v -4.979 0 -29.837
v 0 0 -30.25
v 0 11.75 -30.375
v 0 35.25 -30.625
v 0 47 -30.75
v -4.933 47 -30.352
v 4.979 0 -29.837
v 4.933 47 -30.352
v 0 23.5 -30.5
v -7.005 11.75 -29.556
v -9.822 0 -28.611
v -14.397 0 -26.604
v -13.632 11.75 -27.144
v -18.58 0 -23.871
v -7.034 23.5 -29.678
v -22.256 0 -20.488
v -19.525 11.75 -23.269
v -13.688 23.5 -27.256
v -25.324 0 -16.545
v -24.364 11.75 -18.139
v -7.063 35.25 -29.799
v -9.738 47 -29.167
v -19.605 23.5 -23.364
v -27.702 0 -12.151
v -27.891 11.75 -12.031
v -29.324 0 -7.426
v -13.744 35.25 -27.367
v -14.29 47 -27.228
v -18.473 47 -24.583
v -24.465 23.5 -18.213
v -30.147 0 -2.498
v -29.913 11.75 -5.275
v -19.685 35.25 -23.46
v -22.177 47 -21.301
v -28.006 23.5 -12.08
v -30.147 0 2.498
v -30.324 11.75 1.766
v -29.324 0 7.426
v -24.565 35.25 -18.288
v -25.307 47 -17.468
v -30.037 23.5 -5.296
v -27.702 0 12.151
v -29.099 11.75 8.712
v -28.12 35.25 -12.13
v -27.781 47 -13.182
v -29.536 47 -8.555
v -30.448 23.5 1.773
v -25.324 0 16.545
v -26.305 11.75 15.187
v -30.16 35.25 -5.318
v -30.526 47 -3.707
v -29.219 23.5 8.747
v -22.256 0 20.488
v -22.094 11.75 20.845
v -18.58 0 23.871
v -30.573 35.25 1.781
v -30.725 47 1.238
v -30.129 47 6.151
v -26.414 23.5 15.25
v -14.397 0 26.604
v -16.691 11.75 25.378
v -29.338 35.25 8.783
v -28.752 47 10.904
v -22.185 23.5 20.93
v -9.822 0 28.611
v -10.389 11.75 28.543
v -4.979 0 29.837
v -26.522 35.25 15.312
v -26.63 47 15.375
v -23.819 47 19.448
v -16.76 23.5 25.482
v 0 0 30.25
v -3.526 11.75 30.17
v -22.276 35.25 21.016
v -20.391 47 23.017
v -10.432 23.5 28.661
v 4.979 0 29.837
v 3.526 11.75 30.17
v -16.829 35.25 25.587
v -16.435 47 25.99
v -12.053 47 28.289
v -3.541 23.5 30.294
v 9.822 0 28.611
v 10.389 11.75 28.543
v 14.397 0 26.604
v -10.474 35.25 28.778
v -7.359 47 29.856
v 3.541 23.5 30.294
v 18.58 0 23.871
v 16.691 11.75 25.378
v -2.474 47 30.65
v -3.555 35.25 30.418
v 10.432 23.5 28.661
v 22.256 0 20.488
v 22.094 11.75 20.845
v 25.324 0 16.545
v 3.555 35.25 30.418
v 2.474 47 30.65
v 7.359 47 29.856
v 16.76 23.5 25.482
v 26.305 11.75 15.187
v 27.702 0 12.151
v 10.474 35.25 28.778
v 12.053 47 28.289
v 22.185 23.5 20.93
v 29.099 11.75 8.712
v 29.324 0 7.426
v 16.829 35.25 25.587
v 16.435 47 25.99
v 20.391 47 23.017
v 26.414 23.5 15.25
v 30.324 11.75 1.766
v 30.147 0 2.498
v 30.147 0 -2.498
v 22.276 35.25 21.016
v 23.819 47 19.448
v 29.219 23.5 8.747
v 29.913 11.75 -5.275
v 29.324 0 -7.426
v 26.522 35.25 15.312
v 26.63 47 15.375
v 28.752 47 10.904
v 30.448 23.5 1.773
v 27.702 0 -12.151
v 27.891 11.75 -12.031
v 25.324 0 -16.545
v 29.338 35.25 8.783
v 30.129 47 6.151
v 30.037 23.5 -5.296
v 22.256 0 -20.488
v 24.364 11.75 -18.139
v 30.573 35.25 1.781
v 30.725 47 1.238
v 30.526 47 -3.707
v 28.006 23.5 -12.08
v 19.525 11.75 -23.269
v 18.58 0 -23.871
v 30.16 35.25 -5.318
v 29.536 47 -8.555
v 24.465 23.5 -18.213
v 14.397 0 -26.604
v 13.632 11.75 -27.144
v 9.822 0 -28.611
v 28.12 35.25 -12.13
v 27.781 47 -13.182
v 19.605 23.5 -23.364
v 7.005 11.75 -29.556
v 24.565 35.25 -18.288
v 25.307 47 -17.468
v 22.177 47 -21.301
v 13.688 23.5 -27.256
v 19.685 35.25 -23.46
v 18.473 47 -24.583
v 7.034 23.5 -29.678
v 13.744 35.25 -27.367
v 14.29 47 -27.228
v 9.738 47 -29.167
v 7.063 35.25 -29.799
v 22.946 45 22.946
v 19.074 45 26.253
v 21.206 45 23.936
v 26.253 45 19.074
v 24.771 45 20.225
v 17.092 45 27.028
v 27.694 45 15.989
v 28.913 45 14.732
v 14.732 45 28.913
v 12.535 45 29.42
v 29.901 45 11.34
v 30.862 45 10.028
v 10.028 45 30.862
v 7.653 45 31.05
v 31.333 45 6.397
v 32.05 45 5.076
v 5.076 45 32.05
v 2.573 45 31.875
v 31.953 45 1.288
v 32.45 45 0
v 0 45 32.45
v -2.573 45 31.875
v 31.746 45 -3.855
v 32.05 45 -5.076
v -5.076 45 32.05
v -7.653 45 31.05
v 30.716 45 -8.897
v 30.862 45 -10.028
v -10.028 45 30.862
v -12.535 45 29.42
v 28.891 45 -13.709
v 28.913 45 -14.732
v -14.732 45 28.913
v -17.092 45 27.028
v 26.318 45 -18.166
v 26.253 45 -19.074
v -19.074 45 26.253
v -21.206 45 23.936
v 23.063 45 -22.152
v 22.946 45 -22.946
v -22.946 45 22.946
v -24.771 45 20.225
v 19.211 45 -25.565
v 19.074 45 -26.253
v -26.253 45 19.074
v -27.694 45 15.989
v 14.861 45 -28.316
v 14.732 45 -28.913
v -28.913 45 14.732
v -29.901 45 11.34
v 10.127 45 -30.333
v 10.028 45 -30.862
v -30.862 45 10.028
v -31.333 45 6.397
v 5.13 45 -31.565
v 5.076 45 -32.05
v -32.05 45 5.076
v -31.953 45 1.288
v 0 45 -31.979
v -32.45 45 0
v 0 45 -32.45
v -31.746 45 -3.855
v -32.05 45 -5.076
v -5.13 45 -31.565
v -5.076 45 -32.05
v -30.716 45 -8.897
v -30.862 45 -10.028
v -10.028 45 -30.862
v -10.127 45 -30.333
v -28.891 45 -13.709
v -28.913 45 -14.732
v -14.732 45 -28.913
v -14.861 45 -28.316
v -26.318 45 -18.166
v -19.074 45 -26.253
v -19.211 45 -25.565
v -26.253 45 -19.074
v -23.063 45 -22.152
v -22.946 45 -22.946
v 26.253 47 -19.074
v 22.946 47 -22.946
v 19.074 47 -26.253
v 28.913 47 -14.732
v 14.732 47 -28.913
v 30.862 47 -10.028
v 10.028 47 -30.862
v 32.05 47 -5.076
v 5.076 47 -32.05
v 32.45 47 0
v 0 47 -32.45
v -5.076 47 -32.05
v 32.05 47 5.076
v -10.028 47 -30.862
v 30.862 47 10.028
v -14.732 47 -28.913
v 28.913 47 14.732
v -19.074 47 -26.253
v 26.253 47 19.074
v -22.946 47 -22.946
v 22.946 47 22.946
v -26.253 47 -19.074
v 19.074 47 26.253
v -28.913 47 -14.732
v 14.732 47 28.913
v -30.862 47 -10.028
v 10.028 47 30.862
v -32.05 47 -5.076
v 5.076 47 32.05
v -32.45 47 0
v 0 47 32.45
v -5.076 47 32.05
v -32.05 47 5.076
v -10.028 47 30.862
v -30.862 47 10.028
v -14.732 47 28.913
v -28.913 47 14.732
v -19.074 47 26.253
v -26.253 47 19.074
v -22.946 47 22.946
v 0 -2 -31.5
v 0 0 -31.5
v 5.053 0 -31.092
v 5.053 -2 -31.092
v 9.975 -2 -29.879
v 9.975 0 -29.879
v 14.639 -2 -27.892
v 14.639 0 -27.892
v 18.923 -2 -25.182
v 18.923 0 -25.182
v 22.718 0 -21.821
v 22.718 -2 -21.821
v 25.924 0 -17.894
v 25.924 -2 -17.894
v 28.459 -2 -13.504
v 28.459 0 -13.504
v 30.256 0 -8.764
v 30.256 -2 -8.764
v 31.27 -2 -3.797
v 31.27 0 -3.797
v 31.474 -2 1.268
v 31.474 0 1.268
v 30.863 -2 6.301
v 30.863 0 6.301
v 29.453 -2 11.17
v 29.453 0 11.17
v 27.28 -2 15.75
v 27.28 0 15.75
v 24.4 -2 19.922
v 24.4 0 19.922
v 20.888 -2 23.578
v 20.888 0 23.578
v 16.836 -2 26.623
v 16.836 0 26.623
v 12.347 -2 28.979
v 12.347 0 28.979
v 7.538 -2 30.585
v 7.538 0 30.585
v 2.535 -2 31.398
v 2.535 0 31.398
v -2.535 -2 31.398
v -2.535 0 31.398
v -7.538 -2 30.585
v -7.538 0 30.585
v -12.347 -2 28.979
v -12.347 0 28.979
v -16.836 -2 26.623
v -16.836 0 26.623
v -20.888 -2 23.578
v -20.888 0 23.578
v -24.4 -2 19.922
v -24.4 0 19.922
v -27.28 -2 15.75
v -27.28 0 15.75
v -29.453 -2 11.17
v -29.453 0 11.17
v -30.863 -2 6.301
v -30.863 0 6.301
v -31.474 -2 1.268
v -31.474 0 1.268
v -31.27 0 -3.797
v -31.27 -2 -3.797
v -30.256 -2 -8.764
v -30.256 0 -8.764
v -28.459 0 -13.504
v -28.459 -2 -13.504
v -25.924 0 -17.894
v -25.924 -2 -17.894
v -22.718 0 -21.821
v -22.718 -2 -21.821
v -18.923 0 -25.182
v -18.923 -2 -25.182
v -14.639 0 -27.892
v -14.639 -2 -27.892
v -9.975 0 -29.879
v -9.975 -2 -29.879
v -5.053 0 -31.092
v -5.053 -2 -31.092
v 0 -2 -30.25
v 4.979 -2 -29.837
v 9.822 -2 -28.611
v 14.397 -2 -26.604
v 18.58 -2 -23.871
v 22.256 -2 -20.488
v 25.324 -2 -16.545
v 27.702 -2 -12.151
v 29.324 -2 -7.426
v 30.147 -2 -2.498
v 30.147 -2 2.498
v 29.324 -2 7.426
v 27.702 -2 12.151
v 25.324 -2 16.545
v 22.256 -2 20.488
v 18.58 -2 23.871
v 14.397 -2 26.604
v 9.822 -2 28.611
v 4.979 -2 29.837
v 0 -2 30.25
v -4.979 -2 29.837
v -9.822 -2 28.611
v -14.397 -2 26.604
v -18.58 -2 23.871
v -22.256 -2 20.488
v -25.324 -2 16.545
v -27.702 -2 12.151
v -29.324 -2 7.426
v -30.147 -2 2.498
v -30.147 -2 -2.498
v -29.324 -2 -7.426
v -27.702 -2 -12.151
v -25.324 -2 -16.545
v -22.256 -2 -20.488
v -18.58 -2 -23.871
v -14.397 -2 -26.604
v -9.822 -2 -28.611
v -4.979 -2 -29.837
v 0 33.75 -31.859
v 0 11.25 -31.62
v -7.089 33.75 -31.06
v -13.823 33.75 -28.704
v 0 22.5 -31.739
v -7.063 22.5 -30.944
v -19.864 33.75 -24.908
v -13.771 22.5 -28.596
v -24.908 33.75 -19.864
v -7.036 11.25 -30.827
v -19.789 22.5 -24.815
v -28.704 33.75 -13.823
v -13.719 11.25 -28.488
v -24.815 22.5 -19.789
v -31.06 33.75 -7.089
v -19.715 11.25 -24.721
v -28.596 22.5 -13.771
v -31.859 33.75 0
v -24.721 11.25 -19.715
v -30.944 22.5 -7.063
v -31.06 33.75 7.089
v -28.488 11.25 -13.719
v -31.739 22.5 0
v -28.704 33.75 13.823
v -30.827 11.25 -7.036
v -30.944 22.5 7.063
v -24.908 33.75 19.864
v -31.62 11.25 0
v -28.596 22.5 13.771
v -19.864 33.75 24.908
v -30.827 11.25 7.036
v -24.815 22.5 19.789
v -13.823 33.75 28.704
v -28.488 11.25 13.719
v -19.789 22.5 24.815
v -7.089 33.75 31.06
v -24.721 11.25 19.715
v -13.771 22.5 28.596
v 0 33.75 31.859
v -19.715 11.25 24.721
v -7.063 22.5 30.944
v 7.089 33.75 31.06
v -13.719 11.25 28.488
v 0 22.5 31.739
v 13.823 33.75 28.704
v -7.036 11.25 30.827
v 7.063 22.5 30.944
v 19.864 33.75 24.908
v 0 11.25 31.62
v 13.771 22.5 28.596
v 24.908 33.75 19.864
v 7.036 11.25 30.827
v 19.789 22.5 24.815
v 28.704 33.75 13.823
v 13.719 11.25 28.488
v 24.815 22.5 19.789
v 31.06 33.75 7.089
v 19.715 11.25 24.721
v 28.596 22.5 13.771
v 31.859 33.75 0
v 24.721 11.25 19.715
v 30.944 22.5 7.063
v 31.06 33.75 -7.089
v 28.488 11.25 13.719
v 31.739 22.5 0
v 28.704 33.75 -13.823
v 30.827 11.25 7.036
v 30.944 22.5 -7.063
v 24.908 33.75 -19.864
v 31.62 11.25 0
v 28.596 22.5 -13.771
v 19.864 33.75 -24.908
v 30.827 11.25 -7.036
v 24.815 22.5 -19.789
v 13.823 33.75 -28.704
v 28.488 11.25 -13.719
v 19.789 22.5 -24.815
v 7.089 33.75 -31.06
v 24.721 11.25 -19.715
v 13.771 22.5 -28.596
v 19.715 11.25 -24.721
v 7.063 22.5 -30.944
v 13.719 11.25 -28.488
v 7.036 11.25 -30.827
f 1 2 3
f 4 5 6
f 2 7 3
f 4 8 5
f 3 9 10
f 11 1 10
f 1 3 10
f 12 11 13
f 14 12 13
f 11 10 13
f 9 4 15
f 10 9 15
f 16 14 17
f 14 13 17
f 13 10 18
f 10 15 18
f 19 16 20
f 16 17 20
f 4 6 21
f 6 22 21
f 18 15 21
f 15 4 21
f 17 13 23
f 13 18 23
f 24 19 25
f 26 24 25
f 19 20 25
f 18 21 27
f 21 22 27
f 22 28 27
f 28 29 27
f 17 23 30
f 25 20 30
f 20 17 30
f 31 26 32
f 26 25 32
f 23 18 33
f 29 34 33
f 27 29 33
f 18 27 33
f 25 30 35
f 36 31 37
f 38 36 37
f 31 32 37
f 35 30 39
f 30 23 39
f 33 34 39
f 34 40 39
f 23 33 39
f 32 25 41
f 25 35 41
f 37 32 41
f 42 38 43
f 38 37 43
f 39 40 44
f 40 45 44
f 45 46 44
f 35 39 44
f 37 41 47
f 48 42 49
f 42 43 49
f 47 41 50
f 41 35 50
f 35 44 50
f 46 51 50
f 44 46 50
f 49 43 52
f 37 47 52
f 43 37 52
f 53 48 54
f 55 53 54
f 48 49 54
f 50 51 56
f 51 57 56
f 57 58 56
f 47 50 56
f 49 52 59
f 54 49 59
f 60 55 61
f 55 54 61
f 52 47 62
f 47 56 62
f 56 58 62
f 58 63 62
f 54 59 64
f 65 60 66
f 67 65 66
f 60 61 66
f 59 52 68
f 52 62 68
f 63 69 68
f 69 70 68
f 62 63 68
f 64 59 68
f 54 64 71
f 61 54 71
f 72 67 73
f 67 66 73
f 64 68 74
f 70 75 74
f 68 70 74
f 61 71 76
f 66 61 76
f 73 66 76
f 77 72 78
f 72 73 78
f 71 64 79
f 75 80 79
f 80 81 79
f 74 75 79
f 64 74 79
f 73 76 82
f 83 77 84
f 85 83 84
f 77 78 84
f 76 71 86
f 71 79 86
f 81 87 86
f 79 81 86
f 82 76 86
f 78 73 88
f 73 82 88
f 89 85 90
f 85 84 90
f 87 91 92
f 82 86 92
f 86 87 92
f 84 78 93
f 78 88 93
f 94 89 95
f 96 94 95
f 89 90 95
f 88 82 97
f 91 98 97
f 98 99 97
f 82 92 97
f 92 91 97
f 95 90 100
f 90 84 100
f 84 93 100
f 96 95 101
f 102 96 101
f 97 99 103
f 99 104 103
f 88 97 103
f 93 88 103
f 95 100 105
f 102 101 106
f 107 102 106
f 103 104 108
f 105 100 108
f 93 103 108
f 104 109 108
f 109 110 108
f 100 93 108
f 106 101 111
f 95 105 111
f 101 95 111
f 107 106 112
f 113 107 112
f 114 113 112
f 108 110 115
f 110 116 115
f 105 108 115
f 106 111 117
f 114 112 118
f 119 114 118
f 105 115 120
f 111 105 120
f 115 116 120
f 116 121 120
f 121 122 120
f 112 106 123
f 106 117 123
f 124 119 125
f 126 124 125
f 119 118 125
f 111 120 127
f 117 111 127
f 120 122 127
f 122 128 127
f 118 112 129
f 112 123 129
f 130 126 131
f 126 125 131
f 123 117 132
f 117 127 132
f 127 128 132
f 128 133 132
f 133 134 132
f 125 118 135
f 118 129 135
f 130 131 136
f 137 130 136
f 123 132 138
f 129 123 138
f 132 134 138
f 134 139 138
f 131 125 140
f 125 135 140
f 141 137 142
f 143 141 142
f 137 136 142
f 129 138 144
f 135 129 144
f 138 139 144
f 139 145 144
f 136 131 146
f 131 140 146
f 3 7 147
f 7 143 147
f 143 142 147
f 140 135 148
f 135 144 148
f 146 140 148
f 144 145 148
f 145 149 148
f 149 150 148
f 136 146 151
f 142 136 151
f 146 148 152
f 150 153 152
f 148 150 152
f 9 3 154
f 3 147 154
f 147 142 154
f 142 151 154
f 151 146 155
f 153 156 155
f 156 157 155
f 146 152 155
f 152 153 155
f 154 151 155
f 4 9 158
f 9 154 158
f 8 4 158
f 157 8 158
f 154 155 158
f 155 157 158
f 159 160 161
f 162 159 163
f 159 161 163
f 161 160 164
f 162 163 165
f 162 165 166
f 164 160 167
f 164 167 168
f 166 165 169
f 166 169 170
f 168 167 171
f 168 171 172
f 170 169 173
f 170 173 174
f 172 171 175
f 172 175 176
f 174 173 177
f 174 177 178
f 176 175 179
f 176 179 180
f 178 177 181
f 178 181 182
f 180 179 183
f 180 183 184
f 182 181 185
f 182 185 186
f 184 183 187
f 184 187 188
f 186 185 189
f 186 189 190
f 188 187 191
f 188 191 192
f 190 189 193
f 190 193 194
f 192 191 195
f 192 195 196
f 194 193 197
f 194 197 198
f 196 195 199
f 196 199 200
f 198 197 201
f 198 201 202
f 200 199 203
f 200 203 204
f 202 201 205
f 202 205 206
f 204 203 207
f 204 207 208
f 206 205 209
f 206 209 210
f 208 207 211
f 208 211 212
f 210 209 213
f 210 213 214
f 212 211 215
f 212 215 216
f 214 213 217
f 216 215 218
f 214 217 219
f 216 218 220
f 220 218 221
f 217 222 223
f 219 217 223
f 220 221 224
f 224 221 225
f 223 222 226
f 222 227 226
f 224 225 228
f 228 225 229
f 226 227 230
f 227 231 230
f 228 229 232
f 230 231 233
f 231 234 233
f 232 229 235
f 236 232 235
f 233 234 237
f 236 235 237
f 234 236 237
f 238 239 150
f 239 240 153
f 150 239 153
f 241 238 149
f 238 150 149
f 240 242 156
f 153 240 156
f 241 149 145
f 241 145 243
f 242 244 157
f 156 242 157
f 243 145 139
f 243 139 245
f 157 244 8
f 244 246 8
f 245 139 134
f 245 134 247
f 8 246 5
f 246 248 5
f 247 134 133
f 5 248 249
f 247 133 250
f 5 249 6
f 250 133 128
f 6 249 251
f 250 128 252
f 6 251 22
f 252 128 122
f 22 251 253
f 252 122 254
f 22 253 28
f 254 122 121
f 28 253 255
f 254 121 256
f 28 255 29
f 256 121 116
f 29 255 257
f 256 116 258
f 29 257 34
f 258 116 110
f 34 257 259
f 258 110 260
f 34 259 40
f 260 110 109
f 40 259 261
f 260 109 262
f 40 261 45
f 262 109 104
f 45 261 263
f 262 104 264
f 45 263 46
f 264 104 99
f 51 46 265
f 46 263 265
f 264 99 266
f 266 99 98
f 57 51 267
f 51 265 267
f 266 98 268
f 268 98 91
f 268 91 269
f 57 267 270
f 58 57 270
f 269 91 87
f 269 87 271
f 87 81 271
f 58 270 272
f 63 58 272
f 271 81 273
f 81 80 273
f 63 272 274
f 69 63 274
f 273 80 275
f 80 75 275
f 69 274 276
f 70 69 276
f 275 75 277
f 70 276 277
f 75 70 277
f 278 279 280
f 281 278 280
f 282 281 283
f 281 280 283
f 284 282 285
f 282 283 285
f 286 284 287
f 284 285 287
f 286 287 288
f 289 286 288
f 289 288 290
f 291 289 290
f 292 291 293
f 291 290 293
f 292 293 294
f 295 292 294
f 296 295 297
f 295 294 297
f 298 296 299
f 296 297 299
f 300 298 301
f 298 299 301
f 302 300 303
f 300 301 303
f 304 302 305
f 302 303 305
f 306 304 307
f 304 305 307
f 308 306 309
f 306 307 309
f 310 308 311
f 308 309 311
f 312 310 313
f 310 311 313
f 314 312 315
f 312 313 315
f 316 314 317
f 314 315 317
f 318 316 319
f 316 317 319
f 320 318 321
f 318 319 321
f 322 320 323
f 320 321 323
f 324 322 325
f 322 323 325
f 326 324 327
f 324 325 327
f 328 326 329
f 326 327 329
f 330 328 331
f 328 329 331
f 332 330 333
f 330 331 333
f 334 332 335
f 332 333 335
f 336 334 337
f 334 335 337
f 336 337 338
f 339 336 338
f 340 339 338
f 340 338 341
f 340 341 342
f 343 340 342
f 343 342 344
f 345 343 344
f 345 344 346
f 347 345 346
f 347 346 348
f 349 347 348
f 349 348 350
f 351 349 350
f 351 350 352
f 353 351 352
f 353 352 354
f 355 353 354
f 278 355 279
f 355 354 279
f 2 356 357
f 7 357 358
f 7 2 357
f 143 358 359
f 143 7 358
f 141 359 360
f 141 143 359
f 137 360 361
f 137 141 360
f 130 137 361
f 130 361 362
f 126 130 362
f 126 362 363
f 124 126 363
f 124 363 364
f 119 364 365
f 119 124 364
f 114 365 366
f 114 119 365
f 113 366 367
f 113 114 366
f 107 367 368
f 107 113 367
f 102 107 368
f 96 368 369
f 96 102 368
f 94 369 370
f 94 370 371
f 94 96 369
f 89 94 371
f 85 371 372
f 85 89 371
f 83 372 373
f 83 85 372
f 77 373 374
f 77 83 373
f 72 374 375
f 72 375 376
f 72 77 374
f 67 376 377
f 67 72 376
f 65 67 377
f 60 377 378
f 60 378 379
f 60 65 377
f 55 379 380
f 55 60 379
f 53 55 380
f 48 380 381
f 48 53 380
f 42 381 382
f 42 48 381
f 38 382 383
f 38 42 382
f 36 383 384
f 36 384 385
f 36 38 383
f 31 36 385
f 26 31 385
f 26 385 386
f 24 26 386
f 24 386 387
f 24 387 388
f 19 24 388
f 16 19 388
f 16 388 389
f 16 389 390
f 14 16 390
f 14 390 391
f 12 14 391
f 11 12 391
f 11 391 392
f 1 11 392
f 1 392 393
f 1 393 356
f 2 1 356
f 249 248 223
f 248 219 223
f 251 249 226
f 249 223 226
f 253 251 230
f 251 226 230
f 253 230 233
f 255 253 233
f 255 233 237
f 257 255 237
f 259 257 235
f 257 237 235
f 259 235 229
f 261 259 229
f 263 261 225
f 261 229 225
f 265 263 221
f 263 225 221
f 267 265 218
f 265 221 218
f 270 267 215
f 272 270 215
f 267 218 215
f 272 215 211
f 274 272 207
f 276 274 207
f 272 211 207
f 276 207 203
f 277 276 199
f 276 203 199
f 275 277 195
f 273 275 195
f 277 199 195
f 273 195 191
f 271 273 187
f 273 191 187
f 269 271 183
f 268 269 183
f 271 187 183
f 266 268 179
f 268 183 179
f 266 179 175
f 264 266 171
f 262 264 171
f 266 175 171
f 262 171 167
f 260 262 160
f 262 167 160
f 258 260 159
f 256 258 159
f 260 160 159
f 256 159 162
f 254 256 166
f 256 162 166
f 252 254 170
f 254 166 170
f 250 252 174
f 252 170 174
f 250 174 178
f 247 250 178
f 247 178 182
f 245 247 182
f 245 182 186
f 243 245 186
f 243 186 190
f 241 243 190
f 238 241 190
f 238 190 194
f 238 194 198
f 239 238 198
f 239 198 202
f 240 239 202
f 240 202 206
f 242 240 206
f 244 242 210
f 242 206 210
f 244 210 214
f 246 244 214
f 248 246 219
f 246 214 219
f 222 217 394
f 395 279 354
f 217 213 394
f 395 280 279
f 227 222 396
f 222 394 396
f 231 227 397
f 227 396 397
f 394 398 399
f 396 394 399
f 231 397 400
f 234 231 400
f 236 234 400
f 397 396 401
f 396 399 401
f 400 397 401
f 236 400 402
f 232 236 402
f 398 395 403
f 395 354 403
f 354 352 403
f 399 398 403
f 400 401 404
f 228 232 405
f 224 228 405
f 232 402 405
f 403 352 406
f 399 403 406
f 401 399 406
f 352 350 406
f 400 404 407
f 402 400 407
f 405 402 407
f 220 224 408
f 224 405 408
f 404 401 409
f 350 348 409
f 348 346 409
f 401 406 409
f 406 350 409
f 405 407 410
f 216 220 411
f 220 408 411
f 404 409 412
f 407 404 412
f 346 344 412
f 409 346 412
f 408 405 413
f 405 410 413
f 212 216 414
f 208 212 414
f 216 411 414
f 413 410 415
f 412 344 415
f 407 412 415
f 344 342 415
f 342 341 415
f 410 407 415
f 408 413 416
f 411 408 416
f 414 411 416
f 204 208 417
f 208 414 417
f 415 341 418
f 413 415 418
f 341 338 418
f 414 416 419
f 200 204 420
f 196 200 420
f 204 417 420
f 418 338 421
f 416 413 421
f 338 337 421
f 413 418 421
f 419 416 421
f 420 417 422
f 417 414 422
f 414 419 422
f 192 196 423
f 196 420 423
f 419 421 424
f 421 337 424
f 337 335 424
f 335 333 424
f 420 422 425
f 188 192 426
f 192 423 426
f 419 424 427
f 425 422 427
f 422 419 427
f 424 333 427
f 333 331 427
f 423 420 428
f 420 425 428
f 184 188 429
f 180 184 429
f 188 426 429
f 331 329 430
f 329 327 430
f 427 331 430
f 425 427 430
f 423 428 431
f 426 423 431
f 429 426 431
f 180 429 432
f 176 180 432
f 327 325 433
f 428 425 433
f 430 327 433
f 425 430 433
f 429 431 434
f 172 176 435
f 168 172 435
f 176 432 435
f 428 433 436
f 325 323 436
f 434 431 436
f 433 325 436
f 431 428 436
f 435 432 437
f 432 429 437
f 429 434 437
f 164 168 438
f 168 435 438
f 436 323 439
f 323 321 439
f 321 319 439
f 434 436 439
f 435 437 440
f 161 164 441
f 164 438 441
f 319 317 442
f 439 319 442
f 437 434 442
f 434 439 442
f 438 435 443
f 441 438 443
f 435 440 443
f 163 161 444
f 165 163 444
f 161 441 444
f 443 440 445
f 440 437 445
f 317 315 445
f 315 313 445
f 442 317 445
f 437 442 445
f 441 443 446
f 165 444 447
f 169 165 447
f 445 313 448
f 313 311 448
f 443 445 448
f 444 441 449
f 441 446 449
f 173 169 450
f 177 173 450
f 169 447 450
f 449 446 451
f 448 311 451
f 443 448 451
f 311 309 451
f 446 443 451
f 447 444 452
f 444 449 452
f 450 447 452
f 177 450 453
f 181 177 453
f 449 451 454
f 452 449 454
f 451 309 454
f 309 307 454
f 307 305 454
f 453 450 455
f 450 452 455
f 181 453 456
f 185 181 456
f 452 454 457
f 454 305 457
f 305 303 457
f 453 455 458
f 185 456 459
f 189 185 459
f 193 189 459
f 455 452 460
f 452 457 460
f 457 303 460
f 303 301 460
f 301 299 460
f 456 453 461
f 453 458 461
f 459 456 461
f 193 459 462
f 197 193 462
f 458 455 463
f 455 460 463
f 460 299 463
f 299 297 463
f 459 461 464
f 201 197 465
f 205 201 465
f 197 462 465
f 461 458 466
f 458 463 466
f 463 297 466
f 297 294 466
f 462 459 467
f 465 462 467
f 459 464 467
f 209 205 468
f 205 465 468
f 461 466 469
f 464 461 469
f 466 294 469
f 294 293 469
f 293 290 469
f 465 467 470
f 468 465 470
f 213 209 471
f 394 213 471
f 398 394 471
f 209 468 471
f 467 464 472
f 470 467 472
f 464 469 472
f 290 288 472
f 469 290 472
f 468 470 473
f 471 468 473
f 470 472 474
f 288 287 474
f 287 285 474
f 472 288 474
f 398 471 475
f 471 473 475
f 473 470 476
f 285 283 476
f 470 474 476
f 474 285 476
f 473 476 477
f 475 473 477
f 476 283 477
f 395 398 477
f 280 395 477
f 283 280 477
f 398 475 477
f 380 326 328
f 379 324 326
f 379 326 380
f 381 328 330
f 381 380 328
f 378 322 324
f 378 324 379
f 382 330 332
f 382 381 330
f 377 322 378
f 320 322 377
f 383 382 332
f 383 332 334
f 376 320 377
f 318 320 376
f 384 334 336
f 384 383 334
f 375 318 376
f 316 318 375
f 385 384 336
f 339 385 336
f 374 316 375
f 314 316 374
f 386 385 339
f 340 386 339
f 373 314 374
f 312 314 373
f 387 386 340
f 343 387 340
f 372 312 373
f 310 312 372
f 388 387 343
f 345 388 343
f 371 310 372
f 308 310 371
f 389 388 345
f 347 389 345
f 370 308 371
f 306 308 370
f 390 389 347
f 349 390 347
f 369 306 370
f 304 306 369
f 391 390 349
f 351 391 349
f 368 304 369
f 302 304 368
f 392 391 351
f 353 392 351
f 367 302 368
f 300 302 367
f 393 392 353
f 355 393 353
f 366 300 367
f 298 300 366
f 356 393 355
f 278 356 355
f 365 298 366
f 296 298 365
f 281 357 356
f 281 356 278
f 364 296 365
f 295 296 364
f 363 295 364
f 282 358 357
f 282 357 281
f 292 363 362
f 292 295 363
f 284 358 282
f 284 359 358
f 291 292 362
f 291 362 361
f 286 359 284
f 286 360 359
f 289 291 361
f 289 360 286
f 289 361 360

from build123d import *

# Parameters (mm, degrees)
SKETCH_2_R      = 31.5
SKETCH_2_R_2    = 30.249929249
EXTRUDE_1_DEPTH = 2


with BuildPart() as part:
    # 草图1 → 旋转1 (revolve)
    with BuildSketch(Plane.XY, mode=Mode.PRIVATE) as revolve_1_sk:
        Polygon((-31.978791145, 45), (-31.5, 0), (-30.249929249, 0), (-30.75, 47), (-32.45, 47), (-32.45, 45), align=None)
    revolve(revolve_1_sk.sketch.rotate(Axis((0, -2.4, 0), (0, 1, 0)), 270), axis=Axis((0, -2.4, 0), (0, 1, 0)))

    # 草图2 → 凸台-拉伸1 (add)
    with BuildSketch(Plane.XZ):
        with Locations(Location((0, 0, 0), (0, 0, 270))):
            Circle(SKETCH_2_R)
        with Locations(Location((0, 0, 0), (0, 0, 270))):
            Circle(SKETCH_2_R_2, mode=Mode.SUBTRACT)
    extrude(amount=EXTRUDE_1_DEPTH)


solid = part.part
